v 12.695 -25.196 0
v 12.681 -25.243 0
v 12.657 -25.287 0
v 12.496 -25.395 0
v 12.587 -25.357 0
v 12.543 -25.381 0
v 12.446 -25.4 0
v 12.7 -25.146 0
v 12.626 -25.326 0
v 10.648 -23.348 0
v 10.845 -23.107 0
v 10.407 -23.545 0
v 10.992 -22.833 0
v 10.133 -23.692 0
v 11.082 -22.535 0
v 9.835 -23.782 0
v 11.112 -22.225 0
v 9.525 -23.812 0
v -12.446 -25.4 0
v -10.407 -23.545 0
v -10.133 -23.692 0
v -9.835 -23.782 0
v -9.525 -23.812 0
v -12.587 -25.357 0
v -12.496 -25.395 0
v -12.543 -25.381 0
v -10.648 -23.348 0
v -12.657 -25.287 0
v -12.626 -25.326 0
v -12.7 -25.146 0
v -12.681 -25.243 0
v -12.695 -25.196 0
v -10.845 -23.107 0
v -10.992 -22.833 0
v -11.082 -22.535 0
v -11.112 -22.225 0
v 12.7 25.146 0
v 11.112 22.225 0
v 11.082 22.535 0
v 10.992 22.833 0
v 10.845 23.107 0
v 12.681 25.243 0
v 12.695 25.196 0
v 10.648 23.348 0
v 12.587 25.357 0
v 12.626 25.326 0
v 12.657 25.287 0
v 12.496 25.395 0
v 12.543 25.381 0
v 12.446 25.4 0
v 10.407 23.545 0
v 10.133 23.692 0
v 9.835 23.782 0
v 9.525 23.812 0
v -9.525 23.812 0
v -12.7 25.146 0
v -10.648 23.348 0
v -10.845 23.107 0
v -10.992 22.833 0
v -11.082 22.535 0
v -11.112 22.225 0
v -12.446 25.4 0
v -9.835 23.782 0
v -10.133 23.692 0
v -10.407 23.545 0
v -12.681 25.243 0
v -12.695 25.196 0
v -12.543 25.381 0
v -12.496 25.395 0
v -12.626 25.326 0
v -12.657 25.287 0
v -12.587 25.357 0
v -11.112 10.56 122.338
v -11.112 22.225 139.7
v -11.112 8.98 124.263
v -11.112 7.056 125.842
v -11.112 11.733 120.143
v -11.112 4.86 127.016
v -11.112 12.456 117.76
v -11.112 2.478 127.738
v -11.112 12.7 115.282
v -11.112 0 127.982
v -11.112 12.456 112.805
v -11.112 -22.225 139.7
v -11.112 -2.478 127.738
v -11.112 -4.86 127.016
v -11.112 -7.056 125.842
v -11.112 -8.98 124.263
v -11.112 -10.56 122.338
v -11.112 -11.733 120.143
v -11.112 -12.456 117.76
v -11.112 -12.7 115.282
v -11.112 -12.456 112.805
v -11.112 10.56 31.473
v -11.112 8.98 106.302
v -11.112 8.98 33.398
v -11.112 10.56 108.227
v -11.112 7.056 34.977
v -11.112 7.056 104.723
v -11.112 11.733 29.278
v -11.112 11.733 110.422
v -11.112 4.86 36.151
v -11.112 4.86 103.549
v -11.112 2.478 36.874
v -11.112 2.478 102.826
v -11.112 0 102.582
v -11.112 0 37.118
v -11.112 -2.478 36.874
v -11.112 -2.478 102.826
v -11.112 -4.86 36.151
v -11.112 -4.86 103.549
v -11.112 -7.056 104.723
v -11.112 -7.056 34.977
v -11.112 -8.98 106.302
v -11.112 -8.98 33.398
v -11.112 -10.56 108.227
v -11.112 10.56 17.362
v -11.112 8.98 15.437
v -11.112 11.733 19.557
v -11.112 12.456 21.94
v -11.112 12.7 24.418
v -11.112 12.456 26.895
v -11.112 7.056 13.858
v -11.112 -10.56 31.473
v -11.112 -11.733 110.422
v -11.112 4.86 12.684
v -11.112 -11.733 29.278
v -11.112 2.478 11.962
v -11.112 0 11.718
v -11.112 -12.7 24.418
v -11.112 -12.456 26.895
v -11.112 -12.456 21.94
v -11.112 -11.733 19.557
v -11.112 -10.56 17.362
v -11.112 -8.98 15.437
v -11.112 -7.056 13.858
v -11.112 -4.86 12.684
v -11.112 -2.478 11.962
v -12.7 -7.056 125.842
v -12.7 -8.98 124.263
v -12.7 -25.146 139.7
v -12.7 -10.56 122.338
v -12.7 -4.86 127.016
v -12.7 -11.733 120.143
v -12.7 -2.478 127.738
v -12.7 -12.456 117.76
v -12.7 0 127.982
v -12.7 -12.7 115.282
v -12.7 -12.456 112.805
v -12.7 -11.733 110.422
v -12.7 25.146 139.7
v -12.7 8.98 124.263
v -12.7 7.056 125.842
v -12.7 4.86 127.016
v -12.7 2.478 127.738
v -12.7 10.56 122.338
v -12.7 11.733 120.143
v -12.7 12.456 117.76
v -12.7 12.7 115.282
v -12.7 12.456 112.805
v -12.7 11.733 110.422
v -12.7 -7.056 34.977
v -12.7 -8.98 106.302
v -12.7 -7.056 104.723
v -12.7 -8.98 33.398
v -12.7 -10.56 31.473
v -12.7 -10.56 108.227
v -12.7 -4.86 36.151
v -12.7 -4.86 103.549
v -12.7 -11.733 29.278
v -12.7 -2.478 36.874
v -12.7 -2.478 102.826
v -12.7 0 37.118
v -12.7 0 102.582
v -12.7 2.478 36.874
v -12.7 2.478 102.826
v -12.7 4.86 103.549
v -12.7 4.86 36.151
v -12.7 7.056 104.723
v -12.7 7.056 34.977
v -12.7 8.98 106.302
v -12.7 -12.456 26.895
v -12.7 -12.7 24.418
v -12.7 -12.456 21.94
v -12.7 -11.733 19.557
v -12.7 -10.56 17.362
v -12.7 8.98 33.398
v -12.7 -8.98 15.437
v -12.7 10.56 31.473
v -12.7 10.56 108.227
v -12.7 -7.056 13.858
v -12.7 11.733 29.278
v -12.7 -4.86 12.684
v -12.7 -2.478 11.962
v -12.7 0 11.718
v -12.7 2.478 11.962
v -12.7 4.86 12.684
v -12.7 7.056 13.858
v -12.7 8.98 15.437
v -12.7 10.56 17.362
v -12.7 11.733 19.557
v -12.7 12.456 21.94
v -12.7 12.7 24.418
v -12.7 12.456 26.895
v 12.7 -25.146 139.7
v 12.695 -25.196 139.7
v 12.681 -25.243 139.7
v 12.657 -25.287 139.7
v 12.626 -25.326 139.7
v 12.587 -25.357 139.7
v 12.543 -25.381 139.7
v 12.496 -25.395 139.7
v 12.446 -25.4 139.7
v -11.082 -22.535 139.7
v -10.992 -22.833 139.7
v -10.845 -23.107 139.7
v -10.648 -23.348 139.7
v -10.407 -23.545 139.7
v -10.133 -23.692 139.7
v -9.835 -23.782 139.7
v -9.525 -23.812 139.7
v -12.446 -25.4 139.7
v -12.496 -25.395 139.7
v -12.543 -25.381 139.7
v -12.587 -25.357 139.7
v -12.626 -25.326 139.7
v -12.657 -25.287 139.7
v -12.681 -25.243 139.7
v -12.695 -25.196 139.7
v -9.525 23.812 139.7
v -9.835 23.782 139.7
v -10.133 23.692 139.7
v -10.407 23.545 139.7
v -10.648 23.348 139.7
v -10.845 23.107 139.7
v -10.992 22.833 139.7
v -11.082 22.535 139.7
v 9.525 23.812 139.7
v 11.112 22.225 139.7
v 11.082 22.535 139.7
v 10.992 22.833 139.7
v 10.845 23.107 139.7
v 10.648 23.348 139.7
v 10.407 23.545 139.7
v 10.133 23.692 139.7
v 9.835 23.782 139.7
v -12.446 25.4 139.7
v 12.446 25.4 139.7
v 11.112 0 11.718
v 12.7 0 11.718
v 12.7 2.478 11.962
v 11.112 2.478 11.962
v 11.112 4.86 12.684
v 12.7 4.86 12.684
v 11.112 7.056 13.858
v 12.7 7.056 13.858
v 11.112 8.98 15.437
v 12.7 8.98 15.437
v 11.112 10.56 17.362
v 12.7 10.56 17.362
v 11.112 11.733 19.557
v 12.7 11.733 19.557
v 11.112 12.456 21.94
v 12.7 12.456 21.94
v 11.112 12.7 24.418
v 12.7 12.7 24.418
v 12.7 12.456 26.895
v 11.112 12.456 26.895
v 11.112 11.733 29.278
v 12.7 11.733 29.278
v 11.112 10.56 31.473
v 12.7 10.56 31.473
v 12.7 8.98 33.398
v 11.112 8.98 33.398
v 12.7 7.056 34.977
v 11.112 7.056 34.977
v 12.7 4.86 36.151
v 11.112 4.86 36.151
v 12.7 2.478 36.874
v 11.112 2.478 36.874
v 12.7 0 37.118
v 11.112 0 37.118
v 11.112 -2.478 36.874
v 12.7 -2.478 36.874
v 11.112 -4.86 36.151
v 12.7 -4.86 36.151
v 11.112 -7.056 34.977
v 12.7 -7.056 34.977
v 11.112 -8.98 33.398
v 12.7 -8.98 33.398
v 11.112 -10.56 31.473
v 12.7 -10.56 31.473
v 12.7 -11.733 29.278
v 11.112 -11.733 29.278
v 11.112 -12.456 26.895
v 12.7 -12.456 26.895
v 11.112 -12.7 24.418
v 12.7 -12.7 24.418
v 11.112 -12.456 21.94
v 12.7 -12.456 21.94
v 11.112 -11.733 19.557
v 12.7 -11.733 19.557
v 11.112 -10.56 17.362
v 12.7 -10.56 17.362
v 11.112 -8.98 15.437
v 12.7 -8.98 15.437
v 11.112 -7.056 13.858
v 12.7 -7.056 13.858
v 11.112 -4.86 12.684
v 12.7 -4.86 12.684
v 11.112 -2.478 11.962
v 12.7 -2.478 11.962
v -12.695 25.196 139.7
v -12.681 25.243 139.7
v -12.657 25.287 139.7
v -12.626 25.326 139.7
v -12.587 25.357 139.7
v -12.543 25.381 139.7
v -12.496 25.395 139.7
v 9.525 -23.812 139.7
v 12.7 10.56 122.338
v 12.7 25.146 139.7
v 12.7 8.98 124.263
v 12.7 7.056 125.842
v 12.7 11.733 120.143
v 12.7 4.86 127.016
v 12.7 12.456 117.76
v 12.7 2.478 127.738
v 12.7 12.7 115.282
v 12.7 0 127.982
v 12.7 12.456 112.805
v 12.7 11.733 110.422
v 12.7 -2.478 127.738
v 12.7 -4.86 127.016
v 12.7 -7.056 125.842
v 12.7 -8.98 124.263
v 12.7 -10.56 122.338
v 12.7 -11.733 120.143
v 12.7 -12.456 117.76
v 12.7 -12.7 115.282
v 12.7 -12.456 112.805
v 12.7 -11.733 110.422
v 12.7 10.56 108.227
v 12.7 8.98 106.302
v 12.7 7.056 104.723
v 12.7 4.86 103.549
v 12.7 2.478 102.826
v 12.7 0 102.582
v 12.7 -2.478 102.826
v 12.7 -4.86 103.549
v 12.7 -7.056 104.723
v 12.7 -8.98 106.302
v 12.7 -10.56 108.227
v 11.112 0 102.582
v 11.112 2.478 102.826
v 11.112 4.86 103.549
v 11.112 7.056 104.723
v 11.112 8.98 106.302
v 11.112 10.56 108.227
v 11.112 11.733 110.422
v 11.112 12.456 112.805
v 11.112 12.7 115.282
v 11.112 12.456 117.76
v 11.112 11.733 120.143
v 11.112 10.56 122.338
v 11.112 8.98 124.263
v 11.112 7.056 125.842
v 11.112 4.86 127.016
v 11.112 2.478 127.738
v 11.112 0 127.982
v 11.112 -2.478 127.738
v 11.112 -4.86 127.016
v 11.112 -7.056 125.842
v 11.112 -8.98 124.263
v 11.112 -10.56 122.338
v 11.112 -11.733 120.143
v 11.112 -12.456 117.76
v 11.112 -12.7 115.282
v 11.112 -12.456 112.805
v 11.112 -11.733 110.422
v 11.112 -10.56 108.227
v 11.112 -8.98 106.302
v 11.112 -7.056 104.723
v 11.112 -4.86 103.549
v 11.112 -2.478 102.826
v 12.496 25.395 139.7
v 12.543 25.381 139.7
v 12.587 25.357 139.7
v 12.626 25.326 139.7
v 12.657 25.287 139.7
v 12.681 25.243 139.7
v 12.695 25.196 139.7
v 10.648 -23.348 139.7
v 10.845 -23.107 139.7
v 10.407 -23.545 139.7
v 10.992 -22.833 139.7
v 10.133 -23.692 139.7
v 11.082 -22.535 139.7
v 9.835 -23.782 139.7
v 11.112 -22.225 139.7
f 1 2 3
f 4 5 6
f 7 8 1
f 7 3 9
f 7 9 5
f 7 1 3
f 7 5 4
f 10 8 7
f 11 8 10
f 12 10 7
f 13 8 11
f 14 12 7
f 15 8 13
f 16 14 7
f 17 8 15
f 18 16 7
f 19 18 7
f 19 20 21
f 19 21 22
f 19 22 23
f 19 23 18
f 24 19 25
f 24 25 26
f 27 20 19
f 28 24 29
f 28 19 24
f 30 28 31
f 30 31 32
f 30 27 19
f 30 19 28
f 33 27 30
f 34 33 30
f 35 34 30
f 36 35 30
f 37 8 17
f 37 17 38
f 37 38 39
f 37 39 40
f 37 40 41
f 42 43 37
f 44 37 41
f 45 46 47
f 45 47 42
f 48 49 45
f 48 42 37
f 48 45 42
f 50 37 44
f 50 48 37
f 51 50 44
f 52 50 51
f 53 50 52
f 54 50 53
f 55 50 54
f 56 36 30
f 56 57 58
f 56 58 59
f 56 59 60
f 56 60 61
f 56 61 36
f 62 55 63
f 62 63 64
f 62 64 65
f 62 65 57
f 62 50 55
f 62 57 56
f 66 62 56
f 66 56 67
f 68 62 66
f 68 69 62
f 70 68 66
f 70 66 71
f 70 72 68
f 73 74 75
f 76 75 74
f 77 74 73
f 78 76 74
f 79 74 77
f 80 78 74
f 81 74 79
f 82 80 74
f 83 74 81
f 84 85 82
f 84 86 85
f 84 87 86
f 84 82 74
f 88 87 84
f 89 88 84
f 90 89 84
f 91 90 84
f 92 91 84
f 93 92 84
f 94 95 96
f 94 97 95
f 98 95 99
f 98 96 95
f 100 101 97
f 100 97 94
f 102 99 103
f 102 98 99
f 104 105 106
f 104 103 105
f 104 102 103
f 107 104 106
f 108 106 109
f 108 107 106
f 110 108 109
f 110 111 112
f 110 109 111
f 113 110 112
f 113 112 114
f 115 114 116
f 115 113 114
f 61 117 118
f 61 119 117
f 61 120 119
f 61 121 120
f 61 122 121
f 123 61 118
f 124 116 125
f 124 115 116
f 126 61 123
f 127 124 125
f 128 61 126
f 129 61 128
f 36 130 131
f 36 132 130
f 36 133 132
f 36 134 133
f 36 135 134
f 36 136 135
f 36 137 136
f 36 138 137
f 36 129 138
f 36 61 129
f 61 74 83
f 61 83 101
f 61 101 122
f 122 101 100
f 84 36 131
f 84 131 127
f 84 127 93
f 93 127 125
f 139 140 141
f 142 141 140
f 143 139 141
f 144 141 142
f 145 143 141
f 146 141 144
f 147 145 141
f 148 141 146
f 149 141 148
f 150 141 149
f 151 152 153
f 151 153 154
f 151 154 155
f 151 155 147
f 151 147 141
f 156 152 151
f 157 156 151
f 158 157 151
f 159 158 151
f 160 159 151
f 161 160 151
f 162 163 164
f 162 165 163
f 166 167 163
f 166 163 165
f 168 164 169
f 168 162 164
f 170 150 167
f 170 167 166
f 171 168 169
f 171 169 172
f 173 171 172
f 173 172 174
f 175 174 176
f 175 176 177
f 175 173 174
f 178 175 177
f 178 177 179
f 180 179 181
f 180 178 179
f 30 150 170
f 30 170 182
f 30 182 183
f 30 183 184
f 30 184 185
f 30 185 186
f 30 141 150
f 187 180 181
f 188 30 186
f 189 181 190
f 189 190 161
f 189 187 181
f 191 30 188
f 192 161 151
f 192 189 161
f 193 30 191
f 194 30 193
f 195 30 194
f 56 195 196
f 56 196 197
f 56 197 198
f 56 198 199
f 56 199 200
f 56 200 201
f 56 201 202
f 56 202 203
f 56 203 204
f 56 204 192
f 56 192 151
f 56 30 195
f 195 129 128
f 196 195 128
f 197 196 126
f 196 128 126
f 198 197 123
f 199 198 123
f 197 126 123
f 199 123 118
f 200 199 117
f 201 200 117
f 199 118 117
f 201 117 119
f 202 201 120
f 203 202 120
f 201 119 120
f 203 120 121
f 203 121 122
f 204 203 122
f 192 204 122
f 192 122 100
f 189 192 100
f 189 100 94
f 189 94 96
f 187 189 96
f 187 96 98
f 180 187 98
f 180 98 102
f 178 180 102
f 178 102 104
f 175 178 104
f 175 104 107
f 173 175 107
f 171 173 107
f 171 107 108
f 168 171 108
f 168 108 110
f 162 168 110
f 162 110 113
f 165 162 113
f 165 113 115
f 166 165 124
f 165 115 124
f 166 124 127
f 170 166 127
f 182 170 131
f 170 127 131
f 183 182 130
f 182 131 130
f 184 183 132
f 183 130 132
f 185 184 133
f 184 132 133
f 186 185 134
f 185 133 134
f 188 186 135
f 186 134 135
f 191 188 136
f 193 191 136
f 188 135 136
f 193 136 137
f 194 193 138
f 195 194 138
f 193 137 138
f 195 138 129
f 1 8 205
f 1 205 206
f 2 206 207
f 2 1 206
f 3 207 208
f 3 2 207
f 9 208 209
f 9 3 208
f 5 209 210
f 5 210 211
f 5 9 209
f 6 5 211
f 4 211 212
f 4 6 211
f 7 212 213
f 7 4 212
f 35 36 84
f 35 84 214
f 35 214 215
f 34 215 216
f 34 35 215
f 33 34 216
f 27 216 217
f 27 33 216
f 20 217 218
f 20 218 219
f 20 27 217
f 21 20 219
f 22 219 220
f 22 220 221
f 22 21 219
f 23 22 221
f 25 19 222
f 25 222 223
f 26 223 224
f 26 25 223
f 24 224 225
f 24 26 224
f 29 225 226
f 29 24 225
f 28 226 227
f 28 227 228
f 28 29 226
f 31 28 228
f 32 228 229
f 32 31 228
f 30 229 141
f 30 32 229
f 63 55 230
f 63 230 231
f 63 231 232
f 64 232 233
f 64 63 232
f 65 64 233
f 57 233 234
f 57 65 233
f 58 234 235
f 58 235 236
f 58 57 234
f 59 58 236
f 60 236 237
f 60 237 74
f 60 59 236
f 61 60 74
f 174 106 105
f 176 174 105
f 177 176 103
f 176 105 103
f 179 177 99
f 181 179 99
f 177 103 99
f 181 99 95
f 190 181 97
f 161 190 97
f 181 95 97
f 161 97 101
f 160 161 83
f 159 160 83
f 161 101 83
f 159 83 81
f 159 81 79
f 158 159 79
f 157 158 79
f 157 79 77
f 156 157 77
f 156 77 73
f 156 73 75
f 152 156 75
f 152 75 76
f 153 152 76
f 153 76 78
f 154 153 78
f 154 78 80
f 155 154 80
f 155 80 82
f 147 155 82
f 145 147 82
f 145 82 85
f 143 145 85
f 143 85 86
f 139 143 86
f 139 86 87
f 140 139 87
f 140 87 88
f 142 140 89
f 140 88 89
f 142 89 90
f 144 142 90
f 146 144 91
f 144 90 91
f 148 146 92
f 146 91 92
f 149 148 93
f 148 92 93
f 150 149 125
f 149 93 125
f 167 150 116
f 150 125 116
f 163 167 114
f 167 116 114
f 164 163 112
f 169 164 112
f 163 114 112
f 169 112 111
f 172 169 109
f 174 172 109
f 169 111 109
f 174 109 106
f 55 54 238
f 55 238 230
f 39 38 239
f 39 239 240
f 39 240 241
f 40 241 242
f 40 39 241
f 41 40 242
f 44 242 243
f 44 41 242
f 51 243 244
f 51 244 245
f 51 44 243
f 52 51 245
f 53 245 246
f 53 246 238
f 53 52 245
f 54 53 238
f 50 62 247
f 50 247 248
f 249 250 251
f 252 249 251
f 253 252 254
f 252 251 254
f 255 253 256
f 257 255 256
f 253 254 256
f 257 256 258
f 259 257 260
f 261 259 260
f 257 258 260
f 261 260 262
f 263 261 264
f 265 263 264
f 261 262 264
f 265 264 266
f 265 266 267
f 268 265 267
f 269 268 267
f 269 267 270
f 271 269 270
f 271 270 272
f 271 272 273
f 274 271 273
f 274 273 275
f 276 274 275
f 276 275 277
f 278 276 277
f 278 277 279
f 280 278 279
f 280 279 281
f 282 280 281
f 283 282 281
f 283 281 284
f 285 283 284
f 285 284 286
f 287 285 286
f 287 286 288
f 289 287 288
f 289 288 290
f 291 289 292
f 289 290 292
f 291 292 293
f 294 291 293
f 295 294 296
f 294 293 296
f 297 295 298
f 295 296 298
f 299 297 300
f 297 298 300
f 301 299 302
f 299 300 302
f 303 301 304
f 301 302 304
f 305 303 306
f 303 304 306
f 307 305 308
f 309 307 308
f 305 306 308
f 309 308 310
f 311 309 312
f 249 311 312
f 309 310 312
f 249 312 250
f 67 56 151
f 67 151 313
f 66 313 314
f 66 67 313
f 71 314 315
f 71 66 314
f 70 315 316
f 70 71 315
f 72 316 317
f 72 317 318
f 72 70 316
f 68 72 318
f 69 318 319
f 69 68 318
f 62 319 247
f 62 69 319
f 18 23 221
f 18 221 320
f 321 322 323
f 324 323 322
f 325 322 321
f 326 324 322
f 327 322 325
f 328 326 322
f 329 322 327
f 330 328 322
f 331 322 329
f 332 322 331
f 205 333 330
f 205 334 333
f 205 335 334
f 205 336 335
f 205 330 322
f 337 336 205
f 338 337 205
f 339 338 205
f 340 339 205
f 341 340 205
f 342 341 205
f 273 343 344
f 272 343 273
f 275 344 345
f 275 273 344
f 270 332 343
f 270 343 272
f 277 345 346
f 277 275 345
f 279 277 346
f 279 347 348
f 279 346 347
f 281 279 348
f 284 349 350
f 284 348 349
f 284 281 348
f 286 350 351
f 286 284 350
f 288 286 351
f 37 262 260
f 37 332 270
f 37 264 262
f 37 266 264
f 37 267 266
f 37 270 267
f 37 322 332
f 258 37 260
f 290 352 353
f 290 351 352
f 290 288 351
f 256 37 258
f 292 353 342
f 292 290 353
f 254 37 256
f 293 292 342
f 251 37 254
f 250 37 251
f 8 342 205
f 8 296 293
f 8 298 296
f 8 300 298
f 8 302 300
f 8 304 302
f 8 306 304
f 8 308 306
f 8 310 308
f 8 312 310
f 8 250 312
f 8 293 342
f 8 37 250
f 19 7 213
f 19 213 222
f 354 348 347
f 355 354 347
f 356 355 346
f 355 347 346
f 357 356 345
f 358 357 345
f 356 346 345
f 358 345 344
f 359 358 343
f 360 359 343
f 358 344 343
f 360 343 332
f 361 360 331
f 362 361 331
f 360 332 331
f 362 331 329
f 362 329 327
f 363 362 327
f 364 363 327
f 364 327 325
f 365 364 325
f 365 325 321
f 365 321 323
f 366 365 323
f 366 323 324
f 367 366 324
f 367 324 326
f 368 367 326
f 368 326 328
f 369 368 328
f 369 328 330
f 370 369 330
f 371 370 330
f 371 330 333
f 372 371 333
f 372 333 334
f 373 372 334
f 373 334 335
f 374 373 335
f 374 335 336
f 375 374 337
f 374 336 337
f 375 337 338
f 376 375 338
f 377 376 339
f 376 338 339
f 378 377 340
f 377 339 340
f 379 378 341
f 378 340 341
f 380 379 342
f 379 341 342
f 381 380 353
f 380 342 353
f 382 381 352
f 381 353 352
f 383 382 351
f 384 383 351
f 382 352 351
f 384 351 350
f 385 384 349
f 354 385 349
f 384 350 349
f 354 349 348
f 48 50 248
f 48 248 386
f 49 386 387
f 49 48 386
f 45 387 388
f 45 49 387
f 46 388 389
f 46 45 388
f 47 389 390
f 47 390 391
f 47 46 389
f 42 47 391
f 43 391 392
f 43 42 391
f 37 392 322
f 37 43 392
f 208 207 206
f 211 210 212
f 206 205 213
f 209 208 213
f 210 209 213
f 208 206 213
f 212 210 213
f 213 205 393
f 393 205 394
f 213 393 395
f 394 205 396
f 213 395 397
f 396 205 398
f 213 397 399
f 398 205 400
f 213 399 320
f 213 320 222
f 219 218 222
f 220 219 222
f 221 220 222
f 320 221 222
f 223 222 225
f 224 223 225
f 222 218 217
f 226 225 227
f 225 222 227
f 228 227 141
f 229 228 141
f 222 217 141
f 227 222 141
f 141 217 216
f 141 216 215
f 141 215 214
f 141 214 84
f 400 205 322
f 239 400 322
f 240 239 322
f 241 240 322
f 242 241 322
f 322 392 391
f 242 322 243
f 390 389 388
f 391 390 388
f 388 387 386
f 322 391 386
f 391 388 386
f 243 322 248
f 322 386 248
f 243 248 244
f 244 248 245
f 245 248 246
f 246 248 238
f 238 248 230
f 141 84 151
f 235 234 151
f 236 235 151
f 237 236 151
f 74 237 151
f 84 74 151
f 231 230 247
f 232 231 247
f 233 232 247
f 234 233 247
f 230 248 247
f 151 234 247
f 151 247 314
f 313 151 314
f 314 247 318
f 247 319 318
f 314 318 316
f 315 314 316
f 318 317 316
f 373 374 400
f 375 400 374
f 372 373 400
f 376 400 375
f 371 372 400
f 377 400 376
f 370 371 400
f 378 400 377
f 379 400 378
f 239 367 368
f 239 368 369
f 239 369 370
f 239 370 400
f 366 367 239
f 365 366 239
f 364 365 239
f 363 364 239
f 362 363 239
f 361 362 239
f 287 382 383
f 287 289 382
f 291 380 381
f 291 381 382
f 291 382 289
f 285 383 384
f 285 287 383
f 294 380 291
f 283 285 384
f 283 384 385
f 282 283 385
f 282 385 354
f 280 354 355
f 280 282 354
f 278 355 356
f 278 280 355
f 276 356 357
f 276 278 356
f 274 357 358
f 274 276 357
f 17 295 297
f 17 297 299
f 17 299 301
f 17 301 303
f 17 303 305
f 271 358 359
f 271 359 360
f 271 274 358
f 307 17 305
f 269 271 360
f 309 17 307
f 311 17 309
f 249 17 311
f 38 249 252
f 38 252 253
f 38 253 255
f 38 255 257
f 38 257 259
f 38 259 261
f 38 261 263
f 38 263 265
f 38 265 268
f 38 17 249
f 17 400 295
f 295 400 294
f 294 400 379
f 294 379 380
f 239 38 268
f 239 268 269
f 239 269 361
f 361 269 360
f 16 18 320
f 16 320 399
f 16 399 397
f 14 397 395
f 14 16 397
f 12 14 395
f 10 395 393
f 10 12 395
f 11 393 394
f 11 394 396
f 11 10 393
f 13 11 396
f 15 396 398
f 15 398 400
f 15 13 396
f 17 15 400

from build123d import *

# Parameters (mm, degrees)
BOSS_EXTRUDE1_DEPTH = 139.7
SKETCH2_R           = 12.7
CUT_EXTRUDE2_DEPTH  = 26.4


with BuildPart() as part:
    # Sketch1 → Boss-Extrude1 (new body)
    with BuildSketch(Plane(origin=(0, 0, 0), x_dir=(-1, 0, 0), z_dir=(0, 0, -1))):
        with BuildLine():
            Line((-12.7, 25.146), (-12.7, -25.146))
            ThreePointArc((-12.7, -25.146), (-12.625605122, -25.325605122), (-12.446, -25.4))
            Line((-12.446, -25.4), (12.446, -25.4))
            ThreePointArc((12.446, -25.4), (12.625605122, -25.325605122), (12.7, -25.146))
            Line((12.7, -25.146), (12.7, 25.146))
            ThreePointArc((12.7, 25.146), (12.625605122, 25.325605122), (12.446, 25.4))
            Line((12.446, 25.4), (-12.446, 25.4))
            ThreePointArc((-12.446, 25.4), (-12.625605122, 25.325605122), (-12.7, 25.146))
        make_face()
        with BuildLine():
            Line((-11.1125, -22.225), (-11.1125, 22.225))
            ThreePointArc((-11.1125, 22.225), (-10.647532015, 23.347532015), (-9.525, 23.8125))
            Line((-9.525, 23.8125), (9.525, 23.8125))
            ThreePointArc((9.525, 23.8125), (10.647532015, 23.347532015), (11.1125, 22.225))
            Line((11.1125, 22.225), (11.1125, -22.225))
            ThreePointArc((11.1125, -22.225), (10.647532015, -23.347532015), (9.525, -23.8125))
            Line((9.525, -23.8125), (-9.525, -23.8125))
            ThreePointArc((-9.525, -23.8125), (-10.647532015, -23.347532015), (-11.1125, -22.225))
        make_face(mode=Mode.SUBTRACT)
    extrude(amount=-BOSS_EXTRUDE1_DEPTH)

    # Sketch2 → Cut-Extrude2 (cut, through all)
    with BuildSketch(Plane(origin=(12.7, 0, 0), x_dir=(0, 0, -1), z_dir=(1, 0, 0))):
        with Locations((-115.282472, 0)):
            Circle(SKETCH2_R)
        with Locations((-24.417528, 0)):
            Circle(SKETCH2_R)
    extrude(amount=-CUT_EXTRUDE2_DEPTH, mode=Mode.SUBTRACT)


solid = part.part
